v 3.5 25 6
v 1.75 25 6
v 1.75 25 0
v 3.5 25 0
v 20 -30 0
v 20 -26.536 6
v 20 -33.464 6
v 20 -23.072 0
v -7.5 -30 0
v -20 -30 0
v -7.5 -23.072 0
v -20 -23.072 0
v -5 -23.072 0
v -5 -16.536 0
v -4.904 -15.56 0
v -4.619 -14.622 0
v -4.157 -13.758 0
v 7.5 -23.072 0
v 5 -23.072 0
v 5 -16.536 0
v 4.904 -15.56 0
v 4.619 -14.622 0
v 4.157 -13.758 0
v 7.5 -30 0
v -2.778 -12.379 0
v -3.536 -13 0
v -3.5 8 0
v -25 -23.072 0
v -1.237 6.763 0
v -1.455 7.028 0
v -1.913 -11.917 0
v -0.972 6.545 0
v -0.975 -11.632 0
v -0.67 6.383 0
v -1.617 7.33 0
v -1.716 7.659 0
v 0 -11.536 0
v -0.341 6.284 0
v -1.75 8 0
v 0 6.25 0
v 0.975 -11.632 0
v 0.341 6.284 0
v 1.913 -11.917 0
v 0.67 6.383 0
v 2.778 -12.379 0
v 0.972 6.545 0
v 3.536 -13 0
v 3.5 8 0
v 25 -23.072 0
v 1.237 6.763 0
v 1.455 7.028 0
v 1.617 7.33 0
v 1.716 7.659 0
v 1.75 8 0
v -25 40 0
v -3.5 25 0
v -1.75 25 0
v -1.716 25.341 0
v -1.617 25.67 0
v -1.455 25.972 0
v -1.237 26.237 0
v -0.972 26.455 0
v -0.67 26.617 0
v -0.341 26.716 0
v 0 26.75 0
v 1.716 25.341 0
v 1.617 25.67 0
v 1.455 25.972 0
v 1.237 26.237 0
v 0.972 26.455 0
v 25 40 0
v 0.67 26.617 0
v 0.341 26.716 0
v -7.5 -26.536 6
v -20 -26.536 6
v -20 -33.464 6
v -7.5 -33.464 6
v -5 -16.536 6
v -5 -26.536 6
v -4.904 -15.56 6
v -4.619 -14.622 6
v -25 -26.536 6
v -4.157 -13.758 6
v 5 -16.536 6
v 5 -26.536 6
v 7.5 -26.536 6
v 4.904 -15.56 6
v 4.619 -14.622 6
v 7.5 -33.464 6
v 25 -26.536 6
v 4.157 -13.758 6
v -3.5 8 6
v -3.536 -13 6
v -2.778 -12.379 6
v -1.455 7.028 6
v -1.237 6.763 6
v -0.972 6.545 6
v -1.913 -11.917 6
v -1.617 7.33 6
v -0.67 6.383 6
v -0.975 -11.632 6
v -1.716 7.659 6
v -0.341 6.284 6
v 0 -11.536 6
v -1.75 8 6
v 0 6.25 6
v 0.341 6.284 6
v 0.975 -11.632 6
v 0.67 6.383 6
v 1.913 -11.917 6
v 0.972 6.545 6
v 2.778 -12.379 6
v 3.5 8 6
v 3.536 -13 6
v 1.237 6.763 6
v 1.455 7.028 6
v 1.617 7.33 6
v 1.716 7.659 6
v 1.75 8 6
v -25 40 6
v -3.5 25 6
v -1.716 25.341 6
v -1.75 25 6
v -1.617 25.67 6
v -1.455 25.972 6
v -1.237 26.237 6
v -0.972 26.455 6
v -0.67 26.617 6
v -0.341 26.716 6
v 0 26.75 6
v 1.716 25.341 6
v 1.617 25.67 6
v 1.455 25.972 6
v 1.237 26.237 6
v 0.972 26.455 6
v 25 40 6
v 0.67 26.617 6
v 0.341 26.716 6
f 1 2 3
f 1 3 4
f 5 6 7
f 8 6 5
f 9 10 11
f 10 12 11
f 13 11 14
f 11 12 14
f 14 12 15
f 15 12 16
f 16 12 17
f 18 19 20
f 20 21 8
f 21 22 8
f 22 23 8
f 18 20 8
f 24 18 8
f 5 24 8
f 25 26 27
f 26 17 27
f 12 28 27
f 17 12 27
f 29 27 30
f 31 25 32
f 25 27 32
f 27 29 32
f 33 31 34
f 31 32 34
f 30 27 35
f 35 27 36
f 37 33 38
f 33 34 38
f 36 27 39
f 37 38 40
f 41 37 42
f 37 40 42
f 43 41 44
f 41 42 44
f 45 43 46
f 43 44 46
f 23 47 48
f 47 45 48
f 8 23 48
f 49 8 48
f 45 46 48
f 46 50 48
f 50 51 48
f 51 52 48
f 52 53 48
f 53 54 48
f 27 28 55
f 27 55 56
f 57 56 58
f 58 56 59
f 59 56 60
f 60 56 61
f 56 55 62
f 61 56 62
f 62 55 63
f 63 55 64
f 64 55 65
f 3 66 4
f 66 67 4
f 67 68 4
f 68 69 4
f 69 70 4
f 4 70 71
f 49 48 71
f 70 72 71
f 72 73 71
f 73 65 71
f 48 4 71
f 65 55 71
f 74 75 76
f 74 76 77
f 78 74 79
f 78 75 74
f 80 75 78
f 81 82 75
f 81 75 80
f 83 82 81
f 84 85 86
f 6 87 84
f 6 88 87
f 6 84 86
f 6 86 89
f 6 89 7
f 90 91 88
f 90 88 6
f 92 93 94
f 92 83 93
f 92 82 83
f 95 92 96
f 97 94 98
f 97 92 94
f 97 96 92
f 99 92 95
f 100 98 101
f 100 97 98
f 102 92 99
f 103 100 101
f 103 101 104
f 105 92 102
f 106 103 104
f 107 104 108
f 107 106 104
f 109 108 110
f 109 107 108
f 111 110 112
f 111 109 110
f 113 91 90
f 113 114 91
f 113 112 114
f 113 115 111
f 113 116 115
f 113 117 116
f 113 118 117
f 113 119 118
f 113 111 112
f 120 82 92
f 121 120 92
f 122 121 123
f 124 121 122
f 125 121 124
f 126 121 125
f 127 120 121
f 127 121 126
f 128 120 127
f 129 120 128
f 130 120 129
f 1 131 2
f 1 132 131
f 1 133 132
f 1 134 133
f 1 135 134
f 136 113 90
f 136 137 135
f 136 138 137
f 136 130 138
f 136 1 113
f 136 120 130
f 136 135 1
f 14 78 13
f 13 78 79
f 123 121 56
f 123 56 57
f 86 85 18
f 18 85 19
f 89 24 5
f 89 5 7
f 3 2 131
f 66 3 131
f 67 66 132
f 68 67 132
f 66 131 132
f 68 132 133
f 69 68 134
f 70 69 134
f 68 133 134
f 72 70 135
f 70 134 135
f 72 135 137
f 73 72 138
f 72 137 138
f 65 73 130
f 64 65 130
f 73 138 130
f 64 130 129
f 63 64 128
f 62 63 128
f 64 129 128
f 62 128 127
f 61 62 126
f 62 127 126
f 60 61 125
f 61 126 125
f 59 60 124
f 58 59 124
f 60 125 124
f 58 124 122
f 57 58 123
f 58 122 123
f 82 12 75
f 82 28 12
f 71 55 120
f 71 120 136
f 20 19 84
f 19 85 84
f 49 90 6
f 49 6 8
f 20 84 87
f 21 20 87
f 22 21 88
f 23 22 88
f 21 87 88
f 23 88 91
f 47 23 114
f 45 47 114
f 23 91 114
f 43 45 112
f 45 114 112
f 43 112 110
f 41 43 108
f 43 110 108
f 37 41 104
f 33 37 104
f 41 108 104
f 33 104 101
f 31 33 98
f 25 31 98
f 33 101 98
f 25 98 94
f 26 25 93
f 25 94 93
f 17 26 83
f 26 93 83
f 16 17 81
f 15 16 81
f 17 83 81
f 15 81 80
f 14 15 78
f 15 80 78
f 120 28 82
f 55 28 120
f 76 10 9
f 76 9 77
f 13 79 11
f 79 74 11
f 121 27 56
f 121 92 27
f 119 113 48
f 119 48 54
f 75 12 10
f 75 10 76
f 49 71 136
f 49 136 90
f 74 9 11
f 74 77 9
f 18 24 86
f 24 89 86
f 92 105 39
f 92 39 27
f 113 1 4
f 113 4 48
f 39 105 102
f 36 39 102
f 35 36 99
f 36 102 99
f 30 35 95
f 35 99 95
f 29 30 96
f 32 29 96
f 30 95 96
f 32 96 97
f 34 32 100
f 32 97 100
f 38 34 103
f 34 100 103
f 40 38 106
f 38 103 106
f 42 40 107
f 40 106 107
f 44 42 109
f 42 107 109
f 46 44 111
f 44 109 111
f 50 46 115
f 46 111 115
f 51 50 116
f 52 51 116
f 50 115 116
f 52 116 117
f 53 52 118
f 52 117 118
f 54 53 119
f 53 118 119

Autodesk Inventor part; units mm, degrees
ref_plane "YZ Plane" through (0, 0, 0) normal (1, 0, 0) x (0, 1, 0)
ref_plane "XZ Plane" through (0, 0, 0) normal (0, 1, 0) x (-1, 0, 0)
ref_plane "XY Plane" through (0, 0, 0) normal (0, 0, 1) x (1, 0, 0)
sketch "Sketch1" plane through (0, 0, 0) normal (0, 0, 1) x (1, 0, 0)
  line L0 (25, -30) -> (-25, -30)
  line L1 (-25, -30) -> (-25, 30)
  line L2 (-25, 30) -> (25, 30)
  line L3 (25, 30) -> (25, -30)
  line L4 (-25, 0) -> (25, 0) construction
  point P0 (0, 0)
  point P1 (0, 0)
  dimension "d0" = 50
  dimension "d1" = 60
extrude "Extrusion1" add sketch "Sketch1" along normal blind 6
sketch "Sketch2" plane through (-25, -30, 0) normal (-1, 0, 0) x (0, 0, 1)
  line L0 (0, 0) -> (6, 0) projected
  line L1 (6, -3.4641) -> (-173.2051, 100) construction
  line L2 (0, 0) -> (6, -3.4641)
  line L3 (6, -3.4641) -> (6, 0)
  point P0 (0, 30)
extrude "Extrusion2" add sketch "Sketch2" against normal blind 50
sketch "Sketch4" plane through (-25, 30, 0) normal (-1, 0, 0) x (0, 0, 1)
  line L0 (6, -63.4641) -> (6, 0) projected
  line L1 (0, -60) -> (0, 0) projected
  line L2 (0, -60) -> (6, -63.4641) projected
  line L3 (6, -56.5359) -> (-167.2051, 43.4641) construction
  line L4 (0, -53.0718) -> (6, -56.5359)
  point P0 (0, -30)
extrude "Extrusion3" cut sketch "Sketch4" against normal blind 5
sketch "Sketch7" plane through (0, 0, 0) normal (1, 0, 0) x (0, 1, 0)
  line L0 (-23.0718, 0) -> (-30, 0) construction
  line L1 (70, -173.2051) -> (-33.4641, 6) construction
  line L2 (-33.4641, 6) -> (-26.5359, 6) construction
  line L3 (-26.5359, 6) -> (73.4641, -167.2051) construction
  line L4 (-33.4641, 6) -> (-30, 0)
  line L5 (-23.0718, 0) -> (-30, 0)
  line L6 (-33.4641, 6) -> (-26.5359, 6)
  line L7 (-26.5359, 6) -> (-23.0718, 0)
  point P0 (0, 0)
extrude "Extrusion6" cut sketch "Sketch7" along normal mid plane 15
mirror "Mirror1" about plane through (0, 0, 0) normal (1, 0, 0) of "Extrusion3"
sketch "Sketch8" plane through (0, 0, 6) normal (0, 0, 1) x (1, 0, 0)
  line L0 (-7.5, -26.5359) -> (7.5, -26.5359) projected
  line L1 (-5, -26.5359) -> (5, -26.5359)
  line L2 (5, -26.5359) -> (5, -16.5359)
  line L3 (5, -16.5359) -> (-5, -16.5359) construction
  line L4 (-5, -16.5359) -> (-5, -26.5359)
  arc A0 (5, -16.5359) -> (-5, -16.5359) centre (0, -16.5359) ccw
  point P0 (0, 0)
  point P1 (0, -26.5359)
  dimension "d23" = 10
  dimension "d24" = 10
extrude "Extrusion7" cut sketch "Sketch8" against normal up to next
thicken "Thicken1" operation add thickness 10 both sides no extend neighbours yes toward (0, 1, 0) faces at (-8.3333, 30, 2)
sketch "Sketch11" plane through (0, 0, 6) normal (0, 0, 1) x (1, 0, 0)
  line L0 (-25, 40) -> (25, 40) projected
  line L1 (-3.5, 25) -> (3.5, 25)
  line L2 (3.5, 25) -> (3.5, 8)
  line L3 (3.5, 8) -> (-3.5, 8)
  line L4 (-3.5, 8) -> (-3.5, 25)
  line L5 (0, 40) -> (0, 0) construction
  line L6 (0, 40) -> (0, 0) construction
  circle A0 centre (0, 25) radius 1.75
  circle A1 centre (0, 8) radius 1.75
  dimension "d40" = 7
  dimension "d41" = 17
  dimension "d42" = 15
  dimension "d43" = 3.5
  dimension "d44" = 3.5
extrude "Extrusion10" cut sketch "Sketch11" against normal up to next
equation "\"d44\" = d43"
properties part number "TRIANGLESHORTLEG"
